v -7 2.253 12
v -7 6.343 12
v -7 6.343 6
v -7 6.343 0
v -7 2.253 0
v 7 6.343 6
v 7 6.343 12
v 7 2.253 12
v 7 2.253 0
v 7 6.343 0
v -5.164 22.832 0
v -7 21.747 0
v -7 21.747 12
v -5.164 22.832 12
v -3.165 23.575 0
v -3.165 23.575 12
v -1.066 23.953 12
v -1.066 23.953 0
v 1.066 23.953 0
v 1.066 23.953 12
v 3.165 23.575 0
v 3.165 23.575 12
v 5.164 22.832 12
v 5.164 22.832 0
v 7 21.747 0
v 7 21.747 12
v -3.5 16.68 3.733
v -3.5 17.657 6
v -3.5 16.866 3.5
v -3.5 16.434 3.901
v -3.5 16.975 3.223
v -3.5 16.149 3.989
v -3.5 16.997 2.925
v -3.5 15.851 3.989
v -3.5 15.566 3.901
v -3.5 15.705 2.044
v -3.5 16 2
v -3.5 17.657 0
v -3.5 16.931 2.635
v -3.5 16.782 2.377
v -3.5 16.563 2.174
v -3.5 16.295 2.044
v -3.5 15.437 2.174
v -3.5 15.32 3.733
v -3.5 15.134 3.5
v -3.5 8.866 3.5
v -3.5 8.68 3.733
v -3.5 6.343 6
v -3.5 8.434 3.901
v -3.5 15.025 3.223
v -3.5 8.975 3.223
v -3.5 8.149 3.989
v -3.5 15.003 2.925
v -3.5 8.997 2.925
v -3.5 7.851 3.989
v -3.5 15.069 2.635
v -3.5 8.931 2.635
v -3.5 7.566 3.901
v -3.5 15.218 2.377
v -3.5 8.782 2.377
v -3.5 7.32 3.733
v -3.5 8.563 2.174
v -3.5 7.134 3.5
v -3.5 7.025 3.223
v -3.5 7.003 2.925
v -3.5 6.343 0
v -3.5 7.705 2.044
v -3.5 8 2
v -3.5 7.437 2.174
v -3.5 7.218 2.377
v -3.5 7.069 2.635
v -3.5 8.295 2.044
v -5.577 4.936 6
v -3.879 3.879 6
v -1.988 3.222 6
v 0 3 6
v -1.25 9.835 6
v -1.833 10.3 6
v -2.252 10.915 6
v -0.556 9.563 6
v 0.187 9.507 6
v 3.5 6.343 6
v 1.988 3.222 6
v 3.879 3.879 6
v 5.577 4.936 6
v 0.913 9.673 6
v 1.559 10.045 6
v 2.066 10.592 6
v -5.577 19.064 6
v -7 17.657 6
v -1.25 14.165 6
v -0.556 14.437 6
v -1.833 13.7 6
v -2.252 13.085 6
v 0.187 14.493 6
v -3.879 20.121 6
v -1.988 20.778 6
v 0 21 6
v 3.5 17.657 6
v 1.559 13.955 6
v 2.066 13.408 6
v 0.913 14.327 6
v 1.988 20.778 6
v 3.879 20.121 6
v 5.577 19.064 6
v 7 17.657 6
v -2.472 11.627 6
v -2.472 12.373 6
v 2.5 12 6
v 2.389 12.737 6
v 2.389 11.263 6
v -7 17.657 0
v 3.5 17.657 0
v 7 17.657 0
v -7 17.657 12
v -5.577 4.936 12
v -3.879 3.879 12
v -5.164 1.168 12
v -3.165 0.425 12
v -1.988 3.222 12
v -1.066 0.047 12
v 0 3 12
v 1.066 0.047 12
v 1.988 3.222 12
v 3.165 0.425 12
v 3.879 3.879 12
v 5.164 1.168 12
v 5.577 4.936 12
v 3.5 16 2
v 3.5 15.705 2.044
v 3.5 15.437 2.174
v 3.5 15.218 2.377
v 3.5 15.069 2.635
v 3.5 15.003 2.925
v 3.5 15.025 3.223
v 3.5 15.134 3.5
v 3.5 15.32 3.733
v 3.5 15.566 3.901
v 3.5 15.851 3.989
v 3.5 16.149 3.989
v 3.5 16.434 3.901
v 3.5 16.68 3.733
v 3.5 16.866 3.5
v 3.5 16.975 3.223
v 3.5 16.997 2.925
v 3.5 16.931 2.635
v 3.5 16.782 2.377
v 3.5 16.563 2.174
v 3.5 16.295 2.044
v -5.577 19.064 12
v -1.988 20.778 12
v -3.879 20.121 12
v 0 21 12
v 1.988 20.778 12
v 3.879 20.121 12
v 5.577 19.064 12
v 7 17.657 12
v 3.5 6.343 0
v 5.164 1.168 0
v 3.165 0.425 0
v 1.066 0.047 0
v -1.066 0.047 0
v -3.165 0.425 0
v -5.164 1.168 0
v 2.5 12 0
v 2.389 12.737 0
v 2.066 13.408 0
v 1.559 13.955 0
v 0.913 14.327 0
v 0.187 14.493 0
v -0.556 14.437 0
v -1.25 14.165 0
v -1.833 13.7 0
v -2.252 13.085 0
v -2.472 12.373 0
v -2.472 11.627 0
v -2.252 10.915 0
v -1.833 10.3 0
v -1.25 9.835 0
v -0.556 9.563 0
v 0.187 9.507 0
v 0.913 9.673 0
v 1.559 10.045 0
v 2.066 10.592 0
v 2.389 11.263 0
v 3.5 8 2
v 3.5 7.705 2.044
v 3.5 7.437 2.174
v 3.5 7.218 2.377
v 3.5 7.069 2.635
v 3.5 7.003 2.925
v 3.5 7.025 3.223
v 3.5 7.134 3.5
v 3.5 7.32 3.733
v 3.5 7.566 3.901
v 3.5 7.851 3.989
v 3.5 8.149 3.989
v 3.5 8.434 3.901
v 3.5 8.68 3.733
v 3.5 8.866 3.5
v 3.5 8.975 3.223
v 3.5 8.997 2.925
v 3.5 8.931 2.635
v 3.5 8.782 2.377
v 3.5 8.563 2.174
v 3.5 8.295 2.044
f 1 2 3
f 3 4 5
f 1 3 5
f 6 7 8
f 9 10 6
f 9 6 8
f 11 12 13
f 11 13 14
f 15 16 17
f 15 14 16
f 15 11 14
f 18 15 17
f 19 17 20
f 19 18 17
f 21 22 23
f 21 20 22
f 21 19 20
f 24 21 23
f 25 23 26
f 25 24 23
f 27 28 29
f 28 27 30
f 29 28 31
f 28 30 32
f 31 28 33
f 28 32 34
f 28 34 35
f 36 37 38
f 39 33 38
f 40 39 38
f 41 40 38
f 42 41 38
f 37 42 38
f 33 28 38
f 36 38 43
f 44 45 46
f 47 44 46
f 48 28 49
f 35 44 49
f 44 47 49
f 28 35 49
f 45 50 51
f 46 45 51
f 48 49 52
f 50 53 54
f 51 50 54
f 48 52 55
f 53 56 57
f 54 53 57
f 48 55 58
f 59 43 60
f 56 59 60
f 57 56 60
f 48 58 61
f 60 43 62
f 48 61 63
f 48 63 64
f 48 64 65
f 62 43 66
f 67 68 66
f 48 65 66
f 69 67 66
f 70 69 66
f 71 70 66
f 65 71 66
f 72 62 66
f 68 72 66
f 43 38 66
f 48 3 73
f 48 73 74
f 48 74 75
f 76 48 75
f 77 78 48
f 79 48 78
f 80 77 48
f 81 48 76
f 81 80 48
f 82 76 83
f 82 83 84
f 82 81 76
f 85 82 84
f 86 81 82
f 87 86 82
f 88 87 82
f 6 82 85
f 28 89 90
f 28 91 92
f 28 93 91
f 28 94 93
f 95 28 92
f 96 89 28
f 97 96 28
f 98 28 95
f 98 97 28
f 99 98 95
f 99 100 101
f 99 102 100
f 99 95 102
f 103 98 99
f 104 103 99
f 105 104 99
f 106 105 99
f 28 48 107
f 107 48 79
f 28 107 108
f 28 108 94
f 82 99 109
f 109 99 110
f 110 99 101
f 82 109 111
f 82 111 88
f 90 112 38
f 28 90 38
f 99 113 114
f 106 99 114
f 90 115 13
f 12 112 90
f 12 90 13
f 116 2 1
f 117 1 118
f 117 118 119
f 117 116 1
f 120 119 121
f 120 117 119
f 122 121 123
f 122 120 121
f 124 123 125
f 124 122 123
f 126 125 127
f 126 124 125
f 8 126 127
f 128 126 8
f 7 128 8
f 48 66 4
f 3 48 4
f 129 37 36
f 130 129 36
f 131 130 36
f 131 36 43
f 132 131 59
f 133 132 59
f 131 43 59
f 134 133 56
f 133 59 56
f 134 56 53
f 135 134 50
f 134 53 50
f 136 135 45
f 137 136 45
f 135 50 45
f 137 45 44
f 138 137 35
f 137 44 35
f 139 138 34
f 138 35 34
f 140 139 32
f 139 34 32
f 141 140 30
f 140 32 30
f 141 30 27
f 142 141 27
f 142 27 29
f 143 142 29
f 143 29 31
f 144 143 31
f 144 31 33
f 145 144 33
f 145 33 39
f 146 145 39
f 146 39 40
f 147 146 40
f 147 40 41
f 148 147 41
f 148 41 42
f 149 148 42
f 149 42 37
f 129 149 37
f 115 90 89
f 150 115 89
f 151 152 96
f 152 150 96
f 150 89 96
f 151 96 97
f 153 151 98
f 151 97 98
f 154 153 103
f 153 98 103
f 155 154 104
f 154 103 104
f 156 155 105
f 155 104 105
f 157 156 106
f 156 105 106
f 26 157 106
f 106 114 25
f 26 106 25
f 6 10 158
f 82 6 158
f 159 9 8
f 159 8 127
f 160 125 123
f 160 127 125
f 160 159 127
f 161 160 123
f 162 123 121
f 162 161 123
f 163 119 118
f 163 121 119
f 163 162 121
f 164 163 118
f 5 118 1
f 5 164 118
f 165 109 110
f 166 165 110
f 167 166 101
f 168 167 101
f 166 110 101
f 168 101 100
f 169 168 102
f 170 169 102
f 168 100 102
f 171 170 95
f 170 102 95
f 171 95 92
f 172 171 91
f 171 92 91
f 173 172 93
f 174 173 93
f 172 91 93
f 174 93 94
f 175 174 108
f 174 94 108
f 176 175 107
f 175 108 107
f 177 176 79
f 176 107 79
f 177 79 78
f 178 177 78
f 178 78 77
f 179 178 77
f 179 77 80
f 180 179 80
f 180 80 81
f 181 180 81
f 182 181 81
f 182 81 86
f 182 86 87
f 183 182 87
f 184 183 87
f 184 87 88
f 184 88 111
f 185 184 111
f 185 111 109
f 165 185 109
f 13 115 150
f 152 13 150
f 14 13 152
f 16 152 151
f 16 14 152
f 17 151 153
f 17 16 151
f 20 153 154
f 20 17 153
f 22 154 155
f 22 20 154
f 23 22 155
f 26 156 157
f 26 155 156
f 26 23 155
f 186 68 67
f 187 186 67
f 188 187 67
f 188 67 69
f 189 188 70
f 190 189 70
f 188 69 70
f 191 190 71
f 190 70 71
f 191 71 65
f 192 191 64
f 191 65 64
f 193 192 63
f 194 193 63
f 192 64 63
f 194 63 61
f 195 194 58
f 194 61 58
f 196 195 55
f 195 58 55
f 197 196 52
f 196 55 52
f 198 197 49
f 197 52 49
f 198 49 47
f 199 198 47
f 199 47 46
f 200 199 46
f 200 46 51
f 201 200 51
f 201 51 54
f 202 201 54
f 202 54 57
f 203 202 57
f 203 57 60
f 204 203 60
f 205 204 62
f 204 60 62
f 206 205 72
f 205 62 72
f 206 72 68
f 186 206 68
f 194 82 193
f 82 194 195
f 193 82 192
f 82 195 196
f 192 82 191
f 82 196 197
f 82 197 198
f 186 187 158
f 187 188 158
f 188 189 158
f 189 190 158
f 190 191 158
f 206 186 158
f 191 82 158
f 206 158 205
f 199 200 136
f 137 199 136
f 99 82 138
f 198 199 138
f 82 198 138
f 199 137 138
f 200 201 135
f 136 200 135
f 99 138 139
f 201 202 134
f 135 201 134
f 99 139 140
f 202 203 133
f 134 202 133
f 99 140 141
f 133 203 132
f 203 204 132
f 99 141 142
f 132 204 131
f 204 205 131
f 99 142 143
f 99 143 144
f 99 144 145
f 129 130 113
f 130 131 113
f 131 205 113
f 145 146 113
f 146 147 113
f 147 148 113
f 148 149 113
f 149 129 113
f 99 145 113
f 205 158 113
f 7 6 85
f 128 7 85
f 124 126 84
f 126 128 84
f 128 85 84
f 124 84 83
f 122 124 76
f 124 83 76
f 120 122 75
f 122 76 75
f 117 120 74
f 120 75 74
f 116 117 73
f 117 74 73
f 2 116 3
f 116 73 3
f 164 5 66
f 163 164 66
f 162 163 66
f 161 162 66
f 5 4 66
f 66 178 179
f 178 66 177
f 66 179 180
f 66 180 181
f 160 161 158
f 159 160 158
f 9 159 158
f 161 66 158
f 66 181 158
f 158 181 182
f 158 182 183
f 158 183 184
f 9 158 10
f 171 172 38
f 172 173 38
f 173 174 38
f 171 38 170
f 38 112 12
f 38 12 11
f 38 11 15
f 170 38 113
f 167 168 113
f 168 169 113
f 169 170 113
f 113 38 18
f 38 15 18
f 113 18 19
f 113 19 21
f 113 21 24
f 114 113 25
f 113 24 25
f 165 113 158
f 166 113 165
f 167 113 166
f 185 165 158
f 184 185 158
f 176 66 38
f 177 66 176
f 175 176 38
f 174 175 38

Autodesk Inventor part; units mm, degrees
ref_plane "YZ Plane" through (0, 0, 0) normal (1, 0, 0) x (0, 1, 0)
ref_plane "XZ Plane" through (0, 0, 0) normal (0, 1, 0) x (-1, 0, 0)
ref_plane "XY Plane" through (0, 0, 0) normal (0, 0, 1) x (1, 0, 0)
sketch "Sketch1" plane through (0, 0, 0) normal (0, 0, 1) x (1, 0, 0)
  arc A0 (7, 17.6569) -> (-7, 17.6569) centre (0, 12) ccw
  arc A1 (7, 21.7468) -> (-7, 21.7468) centre (0, 12) ccw
  line L0 (-7, 17.6569) -> (-7, 21.7468)
  line L1 (7, 17.6569) -> (7, 21.7468)
  line L2 (-7, 17.6569) -> (-3.5, 17.6569)
  line L3 (-3.5, 17.6569) -> (-3.5, 6.3431)
  line L4 (-3.5, 6.3431) -> (-7, 6.3431)
  line L5 (-7, 6.3431) -> (-7, 2.2532)
  arc A2 (-7, 2.2532) -> (7, 2.2532) centre (0, 12) ccw
  arc A3 (-7, 6.3431) -> (7, 6.3431) centre (0, 12) ccw
  line L6 (7, 6.3431) -> (7, 2.2532)
  line L7 (7, 6.3431) -> (3.5, 6.3431)
  line L8 (3.5, 6.3431) -> (3.5, 17.6569)
  line L9 (3.5, 17.6569) -> (7, 17.6569)
  line L10 (0, 0) -> (0, 24) construction
  line L11 (-10.3169, 12) -> (3.5, 12) construction
  point P0 (0, 3)
  dimension "d4" = 24
  dimension "d5" = 12
  dimension "d6" = 14
  dimension "d7" = 9
  dimension "d8" = 3.5
  dimension "d9" = 12
  dimension "d10" = 7
  dimension "d11" = 3.5
  dimension "d12" = 9
  dimension "d13" = 12
extrude "Extrusion1" add sketch "Sketch1" along normal blind 6 contours L9 L8 L7 A3 L4 L3 L2 A0
extrude "Extrusion2" add sketch "Sketch1" along normal blind 12 contours A0 L0 A1 L1 | L6 A2 L5 A3
sketch "Sketch2" plane through (0, 0, 6) normal (0, 0, 1) x (1, 0, 0)
  circle A0 centre (0, 12) radius 2.5
  arc A1 (-7, 2.2532) -> (7, 2.2532) centre (0, 12) ccw projected
  point P0 (0, 0)
  point P1 (0, 0)
  point P2 (0, 0)
  dimension "d18" = 12
  dimension "d19" = 5
extrude "Extrusion3" cut sketch "Sketch2" against normal up to surface (6 mm away)
thread "Thread1" size "M5x0.8" class "6H" standard "ISO Metric profile" full length
sketch "Sketch3" plane through (3.5, 6.3431, 0) normal (1, 0, 0) x (0, 0, -1)
  line L0 (0, 0) -> (0, 11.3137) projected
  point P0 (0, -6.3431)
  point P1 (-3, 1.6569)
  point P2 (-3, 9.6569)
  point P3 (0, 5.6569)
  dimension "d24" = 3
  dimension "d25" = 8
  dimension "d26" = 4
hole "Hole1" at (3.5, 8, 3) at (3.5, 16, 3) direction (-1, 0, 0) diameter 2 depth 7
equation "\"d9\" = 0.5 * d4"
equation "\"d26\" = 0.5 * d25"
properties part number "42"
